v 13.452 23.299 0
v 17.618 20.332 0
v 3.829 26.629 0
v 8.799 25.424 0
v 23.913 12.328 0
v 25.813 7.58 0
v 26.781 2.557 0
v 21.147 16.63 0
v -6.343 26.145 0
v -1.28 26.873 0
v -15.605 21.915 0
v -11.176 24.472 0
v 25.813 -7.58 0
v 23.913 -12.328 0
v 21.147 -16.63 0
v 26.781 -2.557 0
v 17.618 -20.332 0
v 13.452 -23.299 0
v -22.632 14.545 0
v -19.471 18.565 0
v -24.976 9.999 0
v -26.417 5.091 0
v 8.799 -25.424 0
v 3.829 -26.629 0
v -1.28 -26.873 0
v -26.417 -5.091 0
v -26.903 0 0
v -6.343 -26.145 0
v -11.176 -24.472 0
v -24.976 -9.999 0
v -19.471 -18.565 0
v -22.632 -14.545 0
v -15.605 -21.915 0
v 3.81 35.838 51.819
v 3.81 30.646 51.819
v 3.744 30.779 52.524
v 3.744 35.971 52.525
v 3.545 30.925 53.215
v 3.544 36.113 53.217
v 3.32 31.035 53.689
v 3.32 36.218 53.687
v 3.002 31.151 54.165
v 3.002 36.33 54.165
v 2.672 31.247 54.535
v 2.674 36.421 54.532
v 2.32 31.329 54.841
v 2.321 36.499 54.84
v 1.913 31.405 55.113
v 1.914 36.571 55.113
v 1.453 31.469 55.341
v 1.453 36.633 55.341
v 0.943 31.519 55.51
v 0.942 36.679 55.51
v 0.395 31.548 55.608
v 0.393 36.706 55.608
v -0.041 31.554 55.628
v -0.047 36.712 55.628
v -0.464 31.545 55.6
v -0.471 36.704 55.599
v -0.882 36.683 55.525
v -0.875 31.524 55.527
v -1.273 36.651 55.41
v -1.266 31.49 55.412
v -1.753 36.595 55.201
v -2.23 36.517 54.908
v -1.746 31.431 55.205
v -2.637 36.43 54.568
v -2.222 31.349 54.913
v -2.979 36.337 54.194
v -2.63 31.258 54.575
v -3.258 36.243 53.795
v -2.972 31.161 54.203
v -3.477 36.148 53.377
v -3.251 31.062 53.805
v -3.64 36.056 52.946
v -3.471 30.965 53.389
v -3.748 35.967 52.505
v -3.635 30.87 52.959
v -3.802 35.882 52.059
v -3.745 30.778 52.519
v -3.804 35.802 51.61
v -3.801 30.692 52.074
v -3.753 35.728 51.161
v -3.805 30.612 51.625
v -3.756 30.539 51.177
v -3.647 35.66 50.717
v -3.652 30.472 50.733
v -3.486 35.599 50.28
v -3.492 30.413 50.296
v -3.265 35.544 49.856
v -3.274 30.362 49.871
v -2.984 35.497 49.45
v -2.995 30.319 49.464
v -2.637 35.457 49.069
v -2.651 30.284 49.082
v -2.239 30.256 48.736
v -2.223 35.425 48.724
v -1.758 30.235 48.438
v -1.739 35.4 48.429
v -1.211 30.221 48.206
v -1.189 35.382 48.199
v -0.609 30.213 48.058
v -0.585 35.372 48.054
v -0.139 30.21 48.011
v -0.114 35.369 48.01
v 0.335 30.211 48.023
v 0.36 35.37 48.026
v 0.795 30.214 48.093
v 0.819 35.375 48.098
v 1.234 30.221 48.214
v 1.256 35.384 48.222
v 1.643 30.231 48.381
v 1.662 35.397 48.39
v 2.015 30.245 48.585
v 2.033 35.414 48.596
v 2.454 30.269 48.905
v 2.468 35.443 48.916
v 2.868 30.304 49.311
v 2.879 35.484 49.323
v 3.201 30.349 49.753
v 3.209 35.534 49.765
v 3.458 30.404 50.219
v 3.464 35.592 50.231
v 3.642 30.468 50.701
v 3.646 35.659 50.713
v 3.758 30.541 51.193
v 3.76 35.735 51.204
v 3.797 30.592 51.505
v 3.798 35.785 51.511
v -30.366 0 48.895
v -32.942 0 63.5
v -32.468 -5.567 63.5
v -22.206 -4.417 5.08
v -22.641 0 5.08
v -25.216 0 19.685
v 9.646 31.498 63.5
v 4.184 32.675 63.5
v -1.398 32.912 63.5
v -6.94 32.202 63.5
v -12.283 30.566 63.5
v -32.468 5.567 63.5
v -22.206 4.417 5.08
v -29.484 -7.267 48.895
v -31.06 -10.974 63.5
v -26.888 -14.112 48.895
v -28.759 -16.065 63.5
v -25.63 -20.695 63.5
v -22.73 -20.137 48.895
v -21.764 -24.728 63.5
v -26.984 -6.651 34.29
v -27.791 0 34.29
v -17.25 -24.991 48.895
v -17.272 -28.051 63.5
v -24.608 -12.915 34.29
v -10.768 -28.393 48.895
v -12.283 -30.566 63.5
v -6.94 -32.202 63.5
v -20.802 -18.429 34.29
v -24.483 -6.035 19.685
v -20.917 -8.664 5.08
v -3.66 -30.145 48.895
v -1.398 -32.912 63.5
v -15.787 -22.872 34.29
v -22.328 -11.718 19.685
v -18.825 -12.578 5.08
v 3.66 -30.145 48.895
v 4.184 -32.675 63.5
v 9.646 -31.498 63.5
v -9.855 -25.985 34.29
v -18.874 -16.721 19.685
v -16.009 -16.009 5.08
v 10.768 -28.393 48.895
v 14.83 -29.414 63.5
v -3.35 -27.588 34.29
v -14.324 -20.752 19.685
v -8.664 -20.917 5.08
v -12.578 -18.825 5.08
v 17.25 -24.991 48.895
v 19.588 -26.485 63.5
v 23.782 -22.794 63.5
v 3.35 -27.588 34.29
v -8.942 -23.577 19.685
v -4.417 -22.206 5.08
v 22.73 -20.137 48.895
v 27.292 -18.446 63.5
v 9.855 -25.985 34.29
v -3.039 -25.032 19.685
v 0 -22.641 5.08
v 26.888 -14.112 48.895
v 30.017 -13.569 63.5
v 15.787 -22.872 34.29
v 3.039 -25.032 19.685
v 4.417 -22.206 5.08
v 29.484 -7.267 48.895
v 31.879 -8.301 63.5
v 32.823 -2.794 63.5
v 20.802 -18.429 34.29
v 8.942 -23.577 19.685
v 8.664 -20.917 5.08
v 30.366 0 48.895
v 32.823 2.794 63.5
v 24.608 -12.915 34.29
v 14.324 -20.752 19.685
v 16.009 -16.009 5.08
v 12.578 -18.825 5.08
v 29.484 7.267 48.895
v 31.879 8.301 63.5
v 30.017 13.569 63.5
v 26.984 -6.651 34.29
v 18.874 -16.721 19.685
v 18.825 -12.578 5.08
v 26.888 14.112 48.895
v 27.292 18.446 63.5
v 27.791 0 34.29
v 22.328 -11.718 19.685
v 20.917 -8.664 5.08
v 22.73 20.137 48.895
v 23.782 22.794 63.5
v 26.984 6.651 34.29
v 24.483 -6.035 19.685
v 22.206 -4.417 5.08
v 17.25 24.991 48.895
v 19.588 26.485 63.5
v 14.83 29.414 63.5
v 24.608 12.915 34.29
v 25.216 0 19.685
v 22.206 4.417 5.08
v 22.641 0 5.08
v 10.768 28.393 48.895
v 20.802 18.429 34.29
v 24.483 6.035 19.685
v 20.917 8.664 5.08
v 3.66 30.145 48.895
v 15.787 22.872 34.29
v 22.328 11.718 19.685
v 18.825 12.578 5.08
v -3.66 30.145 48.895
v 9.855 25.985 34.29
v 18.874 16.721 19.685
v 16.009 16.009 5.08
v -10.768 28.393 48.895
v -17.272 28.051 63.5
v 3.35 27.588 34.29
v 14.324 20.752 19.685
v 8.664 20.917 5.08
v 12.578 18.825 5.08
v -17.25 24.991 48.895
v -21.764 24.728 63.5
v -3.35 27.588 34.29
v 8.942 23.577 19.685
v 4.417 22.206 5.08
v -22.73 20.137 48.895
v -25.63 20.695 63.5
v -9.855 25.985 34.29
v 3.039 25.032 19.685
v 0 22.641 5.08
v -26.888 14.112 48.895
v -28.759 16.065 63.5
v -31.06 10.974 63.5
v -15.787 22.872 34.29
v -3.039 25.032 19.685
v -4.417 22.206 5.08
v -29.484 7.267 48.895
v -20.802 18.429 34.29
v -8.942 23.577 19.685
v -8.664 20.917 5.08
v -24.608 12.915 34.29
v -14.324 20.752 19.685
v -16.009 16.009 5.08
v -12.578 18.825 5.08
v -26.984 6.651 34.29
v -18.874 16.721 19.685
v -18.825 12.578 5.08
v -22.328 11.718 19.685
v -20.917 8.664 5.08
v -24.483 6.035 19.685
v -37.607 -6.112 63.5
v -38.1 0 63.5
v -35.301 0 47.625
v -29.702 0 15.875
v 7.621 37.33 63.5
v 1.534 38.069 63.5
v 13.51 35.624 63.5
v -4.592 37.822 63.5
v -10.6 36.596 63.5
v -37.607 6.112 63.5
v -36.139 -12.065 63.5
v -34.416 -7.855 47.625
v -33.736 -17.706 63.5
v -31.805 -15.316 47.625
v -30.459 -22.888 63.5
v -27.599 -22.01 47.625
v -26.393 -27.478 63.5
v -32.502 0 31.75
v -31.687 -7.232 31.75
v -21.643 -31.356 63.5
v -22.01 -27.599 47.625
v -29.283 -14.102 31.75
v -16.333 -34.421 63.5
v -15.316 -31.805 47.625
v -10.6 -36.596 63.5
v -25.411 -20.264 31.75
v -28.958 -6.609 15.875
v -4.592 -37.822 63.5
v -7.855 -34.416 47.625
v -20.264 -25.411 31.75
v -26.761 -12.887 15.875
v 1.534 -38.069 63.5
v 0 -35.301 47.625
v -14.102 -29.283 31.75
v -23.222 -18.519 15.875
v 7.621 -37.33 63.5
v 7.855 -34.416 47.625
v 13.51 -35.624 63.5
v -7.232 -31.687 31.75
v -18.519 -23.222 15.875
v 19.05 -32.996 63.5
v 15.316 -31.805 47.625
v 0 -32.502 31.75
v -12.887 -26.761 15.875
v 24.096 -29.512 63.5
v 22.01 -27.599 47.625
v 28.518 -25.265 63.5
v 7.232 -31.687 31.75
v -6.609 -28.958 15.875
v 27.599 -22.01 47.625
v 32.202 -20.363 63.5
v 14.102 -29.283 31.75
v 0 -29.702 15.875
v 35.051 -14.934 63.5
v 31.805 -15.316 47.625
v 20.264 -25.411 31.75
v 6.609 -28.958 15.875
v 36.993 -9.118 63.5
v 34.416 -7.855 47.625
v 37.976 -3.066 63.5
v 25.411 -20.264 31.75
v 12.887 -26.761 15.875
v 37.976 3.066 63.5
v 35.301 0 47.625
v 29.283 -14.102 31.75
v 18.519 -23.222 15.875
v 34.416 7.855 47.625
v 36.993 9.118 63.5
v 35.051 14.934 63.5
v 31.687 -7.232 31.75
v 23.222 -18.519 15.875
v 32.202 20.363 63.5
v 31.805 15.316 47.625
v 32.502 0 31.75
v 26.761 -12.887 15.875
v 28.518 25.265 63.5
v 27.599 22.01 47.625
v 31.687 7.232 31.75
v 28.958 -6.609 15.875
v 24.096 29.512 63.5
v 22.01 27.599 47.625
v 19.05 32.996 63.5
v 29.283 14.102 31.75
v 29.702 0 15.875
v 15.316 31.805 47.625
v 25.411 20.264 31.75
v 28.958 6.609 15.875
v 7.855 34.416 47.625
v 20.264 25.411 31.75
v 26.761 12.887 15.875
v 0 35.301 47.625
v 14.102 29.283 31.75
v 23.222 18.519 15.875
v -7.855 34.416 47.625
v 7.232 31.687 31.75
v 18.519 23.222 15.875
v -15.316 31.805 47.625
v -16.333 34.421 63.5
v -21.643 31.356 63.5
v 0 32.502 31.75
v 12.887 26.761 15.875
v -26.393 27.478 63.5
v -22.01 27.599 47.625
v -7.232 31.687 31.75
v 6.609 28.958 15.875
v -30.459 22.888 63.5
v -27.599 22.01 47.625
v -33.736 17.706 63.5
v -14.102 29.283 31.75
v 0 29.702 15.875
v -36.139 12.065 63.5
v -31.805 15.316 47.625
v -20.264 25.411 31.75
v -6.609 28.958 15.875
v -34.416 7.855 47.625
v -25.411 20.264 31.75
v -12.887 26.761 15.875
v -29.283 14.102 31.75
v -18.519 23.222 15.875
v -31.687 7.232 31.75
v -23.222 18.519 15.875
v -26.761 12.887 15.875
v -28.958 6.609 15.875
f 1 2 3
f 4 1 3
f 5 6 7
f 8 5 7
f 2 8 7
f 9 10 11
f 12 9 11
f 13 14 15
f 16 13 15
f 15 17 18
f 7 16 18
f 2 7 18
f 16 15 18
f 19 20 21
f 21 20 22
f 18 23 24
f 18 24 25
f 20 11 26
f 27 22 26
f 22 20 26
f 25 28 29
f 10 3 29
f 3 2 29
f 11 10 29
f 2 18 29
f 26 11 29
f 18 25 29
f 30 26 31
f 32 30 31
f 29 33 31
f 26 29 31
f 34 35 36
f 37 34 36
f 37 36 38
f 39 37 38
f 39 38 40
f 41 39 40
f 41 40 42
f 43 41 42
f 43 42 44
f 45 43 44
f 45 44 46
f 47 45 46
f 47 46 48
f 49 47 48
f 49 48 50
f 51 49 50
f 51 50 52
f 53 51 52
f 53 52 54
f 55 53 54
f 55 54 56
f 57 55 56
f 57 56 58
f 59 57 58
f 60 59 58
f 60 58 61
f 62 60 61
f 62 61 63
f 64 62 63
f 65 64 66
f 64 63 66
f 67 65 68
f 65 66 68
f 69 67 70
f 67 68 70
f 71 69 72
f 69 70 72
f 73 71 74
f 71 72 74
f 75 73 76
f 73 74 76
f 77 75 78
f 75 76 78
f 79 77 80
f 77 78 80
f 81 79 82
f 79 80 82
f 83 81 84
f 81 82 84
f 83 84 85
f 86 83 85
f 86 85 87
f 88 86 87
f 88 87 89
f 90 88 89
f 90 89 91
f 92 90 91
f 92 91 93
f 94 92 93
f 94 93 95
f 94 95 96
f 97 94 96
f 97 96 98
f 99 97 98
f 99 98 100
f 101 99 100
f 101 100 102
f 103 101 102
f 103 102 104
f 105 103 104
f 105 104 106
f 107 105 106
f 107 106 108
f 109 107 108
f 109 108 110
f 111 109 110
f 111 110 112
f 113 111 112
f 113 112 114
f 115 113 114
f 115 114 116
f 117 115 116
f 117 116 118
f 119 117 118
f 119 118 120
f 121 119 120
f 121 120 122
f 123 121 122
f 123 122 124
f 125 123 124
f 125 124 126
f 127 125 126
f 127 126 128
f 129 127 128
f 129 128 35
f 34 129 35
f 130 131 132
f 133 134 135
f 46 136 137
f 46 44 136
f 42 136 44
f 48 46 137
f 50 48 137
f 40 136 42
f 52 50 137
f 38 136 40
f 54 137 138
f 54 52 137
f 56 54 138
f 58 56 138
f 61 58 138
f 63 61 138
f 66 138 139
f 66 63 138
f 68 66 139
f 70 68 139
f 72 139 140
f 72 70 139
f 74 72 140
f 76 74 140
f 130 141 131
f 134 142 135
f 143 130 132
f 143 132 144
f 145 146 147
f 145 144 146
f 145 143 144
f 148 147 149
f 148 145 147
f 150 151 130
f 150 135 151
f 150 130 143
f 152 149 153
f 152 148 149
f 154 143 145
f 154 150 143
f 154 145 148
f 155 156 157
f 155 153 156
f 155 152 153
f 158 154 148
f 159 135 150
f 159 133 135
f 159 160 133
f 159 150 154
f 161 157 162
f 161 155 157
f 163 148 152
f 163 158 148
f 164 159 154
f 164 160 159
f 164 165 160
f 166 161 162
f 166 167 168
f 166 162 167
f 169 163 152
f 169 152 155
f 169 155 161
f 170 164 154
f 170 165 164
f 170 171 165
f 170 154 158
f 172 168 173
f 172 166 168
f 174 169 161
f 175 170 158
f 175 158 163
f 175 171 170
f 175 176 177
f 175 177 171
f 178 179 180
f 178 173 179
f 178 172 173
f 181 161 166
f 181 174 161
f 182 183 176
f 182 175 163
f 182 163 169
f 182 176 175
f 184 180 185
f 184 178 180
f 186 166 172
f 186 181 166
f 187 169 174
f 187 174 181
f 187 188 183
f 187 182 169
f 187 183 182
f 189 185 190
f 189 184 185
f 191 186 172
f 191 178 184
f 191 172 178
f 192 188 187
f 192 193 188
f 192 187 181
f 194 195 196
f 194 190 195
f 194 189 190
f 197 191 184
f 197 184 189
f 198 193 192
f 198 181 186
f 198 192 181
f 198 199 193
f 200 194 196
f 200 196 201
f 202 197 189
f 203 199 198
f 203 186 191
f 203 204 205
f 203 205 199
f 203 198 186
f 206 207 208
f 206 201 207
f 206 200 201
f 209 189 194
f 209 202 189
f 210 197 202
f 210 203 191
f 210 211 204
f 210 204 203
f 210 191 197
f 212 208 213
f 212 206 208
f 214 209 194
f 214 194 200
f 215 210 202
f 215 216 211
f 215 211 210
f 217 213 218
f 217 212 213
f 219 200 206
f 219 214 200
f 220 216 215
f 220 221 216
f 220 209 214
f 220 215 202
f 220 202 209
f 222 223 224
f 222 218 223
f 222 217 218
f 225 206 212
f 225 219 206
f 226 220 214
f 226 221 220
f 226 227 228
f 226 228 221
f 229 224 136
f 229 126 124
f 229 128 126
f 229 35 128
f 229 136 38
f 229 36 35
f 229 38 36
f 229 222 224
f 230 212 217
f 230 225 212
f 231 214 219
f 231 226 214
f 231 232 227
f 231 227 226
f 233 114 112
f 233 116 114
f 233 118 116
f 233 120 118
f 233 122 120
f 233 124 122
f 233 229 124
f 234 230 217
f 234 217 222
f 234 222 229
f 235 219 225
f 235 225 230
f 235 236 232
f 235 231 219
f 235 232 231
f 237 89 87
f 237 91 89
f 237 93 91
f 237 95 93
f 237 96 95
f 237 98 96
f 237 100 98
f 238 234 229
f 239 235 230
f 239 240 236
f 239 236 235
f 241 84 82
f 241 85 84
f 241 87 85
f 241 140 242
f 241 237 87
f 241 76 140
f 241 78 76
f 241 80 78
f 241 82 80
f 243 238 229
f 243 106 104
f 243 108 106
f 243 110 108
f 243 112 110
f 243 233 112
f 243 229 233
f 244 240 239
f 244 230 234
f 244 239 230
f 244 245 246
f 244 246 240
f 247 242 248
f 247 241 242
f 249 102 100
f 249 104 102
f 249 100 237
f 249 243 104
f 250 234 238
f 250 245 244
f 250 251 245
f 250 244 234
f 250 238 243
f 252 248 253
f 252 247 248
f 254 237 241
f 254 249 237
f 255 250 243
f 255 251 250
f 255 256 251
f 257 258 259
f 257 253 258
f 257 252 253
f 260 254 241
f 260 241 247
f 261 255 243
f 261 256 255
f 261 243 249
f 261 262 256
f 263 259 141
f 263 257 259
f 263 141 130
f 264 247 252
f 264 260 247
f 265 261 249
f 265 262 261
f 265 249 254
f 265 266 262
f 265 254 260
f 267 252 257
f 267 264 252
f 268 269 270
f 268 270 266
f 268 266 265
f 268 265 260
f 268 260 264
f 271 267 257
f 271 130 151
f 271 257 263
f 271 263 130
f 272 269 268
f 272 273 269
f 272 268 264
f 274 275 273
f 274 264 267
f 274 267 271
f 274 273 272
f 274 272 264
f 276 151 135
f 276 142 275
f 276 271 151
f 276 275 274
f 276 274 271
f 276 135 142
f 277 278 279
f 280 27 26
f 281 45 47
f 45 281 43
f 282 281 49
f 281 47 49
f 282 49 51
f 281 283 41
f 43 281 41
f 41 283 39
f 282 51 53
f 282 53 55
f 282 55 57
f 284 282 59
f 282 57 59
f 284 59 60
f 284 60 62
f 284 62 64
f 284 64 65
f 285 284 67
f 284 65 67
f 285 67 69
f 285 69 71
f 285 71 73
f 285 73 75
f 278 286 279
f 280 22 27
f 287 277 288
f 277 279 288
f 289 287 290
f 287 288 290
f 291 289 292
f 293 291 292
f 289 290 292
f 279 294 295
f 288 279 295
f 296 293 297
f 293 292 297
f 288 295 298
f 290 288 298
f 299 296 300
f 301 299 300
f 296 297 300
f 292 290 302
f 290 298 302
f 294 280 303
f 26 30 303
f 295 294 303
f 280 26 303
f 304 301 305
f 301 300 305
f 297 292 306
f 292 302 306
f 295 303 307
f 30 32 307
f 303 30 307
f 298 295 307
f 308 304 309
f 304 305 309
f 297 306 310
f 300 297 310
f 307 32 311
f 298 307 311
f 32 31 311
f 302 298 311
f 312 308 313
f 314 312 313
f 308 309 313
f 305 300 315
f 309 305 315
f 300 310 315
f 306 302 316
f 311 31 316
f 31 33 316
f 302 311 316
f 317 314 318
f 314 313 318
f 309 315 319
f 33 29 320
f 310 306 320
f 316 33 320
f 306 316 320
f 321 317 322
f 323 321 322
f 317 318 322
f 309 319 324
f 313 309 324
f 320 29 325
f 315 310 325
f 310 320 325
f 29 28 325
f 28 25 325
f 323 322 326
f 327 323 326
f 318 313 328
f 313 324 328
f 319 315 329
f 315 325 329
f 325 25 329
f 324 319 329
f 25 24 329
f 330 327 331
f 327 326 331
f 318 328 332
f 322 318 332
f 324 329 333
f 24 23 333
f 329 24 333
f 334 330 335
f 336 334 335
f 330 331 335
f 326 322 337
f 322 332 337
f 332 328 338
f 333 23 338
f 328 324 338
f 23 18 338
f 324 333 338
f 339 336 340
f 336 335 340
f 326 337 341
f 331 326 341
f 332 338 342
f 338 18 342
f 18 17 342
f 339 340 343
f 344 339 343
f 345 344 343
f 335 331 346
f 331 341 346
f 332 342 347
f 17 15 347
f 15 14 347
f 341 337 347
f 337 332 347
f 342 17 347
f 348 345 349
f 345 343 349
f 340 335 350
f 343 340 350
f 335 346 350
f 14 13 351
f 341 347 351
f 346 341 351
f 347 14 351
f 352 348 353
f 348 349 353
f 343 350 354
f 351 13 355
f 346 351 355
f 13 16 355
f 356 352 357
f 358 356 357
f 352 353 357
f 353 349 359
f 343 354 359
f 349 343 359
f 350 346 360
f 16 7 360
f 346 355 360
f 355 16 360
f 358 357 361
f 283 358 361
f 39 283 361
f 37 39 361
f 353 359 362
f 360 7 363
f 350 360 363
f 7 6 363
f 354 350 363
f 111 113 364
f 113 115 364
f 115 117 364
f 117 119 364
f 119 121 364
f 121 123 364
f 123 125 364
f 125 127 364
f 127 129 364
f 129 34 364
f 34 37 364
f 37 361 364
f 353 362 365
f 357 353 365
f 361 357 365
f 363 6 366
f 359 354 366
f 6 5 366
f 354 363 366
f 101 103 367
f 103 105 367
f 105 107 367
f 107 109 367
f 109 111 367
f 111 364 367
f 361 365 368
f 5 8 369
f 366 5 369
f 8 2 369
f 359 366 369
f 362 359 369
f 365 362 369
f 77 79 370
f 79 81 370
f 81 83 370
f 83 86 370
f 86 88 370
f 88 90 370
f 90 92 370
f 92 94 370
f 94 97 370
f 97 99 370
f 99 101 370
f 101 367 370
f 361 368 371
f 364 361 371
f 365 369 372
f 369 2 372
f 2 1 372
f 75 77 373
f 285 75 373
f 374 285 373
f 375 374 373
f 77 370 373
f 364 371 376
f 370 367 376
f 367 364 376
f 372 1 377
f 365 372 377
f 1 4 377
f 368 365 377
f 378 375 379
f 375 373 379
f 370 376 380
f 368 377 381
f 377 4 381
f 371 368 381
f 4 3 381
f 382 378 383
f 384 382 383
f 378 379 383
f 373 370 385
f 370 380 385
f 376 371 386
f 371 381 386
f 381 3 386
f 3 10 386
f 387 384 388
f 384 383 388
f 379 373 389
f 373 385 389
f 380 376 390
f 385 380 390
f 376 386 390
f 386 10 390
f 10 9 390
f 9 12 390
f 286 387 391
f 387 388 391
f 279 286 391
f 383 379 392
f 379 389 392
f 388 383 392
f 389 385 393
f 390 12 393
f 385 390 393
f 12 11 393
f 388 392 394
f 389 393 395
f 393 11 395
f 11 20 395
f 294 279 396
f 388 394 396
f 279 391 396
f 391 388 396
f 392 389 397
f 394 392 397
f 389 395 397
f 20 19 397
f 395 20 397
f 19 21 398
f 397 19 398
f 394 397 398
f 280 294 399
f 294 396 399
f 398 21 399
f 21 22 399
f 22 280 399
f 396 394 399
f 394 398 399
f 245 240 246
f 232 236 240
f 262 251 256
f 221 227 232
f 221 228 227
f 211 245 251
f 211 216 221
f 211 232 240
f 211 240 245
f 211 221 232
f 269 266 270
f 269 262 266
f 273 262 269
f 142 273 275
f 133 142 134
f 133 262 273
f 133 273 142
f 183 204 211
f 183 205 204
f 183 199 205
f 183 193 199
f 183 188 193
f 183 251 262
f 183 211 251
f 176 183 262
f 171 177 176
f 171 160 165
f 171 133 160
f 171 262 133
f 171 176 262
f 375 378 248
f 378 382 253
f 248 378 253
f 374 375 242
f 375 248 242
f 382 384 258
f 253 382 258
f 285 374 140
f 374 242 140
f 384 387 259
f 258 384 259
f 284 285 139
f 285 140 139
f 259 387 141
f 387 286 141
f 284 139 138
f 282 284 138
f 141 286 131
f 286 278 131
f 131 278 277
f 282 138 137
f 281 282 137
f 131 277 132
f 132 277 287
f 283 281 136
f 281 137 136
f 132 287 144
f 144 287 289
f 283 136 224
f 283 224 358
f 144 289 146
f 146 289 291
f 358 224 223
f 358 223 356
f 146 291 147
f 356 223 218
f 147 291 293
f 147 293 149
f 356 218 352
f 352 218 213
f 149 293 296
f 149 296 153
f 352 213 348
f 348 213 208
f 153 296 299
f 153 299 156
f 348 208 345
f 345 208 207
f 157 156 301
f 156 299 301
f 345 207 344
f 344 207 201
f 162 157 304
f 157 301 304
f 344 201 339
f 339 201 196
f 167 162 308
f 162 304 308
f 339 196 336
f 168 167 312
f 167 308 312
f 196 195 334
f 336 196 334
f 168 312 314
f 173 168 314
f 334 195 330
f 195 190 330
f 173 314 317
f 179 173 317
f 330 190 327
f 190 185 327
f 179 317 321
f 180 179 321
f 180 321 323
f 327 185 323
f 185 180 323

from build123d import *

# Parameters (mm, degrees)
F2_T     = -5.08
F3_R     = 3.81
F4_DEPTH = 304.8


# Not quite as in the source:
# - a feature names something its author has since deleted; it is built from what else it names


with BuildPart() as f1:
    # F0 (on Front) → F1 (revolve)
    with BuildSketch(Plane.XZ):
        Polygon((0, 0), (0, 63.5), (-38.1, 63.5), (-26.903236725, 0), align=None)
    revolve(axis=Axis((0, 0, 31.75), (0, 0, 1)))

    # F2
    f2_openings = [f1.faces().sort_by_distance(p)[0] for p in [
        (0, 0, 63.5),
    ]]
    offset(amount=F2_T, openings=f2_openings)

    # F3 (on Front) → F4 (cut)
    with BuildSketch(Plane.XZ):
        with Locations((0, 51.8186431976)):
            Circle(F3_R)
    extrude(amount=-F4_DEPTH, mode=Mode.SUBTRACT)


solid = f1.part
